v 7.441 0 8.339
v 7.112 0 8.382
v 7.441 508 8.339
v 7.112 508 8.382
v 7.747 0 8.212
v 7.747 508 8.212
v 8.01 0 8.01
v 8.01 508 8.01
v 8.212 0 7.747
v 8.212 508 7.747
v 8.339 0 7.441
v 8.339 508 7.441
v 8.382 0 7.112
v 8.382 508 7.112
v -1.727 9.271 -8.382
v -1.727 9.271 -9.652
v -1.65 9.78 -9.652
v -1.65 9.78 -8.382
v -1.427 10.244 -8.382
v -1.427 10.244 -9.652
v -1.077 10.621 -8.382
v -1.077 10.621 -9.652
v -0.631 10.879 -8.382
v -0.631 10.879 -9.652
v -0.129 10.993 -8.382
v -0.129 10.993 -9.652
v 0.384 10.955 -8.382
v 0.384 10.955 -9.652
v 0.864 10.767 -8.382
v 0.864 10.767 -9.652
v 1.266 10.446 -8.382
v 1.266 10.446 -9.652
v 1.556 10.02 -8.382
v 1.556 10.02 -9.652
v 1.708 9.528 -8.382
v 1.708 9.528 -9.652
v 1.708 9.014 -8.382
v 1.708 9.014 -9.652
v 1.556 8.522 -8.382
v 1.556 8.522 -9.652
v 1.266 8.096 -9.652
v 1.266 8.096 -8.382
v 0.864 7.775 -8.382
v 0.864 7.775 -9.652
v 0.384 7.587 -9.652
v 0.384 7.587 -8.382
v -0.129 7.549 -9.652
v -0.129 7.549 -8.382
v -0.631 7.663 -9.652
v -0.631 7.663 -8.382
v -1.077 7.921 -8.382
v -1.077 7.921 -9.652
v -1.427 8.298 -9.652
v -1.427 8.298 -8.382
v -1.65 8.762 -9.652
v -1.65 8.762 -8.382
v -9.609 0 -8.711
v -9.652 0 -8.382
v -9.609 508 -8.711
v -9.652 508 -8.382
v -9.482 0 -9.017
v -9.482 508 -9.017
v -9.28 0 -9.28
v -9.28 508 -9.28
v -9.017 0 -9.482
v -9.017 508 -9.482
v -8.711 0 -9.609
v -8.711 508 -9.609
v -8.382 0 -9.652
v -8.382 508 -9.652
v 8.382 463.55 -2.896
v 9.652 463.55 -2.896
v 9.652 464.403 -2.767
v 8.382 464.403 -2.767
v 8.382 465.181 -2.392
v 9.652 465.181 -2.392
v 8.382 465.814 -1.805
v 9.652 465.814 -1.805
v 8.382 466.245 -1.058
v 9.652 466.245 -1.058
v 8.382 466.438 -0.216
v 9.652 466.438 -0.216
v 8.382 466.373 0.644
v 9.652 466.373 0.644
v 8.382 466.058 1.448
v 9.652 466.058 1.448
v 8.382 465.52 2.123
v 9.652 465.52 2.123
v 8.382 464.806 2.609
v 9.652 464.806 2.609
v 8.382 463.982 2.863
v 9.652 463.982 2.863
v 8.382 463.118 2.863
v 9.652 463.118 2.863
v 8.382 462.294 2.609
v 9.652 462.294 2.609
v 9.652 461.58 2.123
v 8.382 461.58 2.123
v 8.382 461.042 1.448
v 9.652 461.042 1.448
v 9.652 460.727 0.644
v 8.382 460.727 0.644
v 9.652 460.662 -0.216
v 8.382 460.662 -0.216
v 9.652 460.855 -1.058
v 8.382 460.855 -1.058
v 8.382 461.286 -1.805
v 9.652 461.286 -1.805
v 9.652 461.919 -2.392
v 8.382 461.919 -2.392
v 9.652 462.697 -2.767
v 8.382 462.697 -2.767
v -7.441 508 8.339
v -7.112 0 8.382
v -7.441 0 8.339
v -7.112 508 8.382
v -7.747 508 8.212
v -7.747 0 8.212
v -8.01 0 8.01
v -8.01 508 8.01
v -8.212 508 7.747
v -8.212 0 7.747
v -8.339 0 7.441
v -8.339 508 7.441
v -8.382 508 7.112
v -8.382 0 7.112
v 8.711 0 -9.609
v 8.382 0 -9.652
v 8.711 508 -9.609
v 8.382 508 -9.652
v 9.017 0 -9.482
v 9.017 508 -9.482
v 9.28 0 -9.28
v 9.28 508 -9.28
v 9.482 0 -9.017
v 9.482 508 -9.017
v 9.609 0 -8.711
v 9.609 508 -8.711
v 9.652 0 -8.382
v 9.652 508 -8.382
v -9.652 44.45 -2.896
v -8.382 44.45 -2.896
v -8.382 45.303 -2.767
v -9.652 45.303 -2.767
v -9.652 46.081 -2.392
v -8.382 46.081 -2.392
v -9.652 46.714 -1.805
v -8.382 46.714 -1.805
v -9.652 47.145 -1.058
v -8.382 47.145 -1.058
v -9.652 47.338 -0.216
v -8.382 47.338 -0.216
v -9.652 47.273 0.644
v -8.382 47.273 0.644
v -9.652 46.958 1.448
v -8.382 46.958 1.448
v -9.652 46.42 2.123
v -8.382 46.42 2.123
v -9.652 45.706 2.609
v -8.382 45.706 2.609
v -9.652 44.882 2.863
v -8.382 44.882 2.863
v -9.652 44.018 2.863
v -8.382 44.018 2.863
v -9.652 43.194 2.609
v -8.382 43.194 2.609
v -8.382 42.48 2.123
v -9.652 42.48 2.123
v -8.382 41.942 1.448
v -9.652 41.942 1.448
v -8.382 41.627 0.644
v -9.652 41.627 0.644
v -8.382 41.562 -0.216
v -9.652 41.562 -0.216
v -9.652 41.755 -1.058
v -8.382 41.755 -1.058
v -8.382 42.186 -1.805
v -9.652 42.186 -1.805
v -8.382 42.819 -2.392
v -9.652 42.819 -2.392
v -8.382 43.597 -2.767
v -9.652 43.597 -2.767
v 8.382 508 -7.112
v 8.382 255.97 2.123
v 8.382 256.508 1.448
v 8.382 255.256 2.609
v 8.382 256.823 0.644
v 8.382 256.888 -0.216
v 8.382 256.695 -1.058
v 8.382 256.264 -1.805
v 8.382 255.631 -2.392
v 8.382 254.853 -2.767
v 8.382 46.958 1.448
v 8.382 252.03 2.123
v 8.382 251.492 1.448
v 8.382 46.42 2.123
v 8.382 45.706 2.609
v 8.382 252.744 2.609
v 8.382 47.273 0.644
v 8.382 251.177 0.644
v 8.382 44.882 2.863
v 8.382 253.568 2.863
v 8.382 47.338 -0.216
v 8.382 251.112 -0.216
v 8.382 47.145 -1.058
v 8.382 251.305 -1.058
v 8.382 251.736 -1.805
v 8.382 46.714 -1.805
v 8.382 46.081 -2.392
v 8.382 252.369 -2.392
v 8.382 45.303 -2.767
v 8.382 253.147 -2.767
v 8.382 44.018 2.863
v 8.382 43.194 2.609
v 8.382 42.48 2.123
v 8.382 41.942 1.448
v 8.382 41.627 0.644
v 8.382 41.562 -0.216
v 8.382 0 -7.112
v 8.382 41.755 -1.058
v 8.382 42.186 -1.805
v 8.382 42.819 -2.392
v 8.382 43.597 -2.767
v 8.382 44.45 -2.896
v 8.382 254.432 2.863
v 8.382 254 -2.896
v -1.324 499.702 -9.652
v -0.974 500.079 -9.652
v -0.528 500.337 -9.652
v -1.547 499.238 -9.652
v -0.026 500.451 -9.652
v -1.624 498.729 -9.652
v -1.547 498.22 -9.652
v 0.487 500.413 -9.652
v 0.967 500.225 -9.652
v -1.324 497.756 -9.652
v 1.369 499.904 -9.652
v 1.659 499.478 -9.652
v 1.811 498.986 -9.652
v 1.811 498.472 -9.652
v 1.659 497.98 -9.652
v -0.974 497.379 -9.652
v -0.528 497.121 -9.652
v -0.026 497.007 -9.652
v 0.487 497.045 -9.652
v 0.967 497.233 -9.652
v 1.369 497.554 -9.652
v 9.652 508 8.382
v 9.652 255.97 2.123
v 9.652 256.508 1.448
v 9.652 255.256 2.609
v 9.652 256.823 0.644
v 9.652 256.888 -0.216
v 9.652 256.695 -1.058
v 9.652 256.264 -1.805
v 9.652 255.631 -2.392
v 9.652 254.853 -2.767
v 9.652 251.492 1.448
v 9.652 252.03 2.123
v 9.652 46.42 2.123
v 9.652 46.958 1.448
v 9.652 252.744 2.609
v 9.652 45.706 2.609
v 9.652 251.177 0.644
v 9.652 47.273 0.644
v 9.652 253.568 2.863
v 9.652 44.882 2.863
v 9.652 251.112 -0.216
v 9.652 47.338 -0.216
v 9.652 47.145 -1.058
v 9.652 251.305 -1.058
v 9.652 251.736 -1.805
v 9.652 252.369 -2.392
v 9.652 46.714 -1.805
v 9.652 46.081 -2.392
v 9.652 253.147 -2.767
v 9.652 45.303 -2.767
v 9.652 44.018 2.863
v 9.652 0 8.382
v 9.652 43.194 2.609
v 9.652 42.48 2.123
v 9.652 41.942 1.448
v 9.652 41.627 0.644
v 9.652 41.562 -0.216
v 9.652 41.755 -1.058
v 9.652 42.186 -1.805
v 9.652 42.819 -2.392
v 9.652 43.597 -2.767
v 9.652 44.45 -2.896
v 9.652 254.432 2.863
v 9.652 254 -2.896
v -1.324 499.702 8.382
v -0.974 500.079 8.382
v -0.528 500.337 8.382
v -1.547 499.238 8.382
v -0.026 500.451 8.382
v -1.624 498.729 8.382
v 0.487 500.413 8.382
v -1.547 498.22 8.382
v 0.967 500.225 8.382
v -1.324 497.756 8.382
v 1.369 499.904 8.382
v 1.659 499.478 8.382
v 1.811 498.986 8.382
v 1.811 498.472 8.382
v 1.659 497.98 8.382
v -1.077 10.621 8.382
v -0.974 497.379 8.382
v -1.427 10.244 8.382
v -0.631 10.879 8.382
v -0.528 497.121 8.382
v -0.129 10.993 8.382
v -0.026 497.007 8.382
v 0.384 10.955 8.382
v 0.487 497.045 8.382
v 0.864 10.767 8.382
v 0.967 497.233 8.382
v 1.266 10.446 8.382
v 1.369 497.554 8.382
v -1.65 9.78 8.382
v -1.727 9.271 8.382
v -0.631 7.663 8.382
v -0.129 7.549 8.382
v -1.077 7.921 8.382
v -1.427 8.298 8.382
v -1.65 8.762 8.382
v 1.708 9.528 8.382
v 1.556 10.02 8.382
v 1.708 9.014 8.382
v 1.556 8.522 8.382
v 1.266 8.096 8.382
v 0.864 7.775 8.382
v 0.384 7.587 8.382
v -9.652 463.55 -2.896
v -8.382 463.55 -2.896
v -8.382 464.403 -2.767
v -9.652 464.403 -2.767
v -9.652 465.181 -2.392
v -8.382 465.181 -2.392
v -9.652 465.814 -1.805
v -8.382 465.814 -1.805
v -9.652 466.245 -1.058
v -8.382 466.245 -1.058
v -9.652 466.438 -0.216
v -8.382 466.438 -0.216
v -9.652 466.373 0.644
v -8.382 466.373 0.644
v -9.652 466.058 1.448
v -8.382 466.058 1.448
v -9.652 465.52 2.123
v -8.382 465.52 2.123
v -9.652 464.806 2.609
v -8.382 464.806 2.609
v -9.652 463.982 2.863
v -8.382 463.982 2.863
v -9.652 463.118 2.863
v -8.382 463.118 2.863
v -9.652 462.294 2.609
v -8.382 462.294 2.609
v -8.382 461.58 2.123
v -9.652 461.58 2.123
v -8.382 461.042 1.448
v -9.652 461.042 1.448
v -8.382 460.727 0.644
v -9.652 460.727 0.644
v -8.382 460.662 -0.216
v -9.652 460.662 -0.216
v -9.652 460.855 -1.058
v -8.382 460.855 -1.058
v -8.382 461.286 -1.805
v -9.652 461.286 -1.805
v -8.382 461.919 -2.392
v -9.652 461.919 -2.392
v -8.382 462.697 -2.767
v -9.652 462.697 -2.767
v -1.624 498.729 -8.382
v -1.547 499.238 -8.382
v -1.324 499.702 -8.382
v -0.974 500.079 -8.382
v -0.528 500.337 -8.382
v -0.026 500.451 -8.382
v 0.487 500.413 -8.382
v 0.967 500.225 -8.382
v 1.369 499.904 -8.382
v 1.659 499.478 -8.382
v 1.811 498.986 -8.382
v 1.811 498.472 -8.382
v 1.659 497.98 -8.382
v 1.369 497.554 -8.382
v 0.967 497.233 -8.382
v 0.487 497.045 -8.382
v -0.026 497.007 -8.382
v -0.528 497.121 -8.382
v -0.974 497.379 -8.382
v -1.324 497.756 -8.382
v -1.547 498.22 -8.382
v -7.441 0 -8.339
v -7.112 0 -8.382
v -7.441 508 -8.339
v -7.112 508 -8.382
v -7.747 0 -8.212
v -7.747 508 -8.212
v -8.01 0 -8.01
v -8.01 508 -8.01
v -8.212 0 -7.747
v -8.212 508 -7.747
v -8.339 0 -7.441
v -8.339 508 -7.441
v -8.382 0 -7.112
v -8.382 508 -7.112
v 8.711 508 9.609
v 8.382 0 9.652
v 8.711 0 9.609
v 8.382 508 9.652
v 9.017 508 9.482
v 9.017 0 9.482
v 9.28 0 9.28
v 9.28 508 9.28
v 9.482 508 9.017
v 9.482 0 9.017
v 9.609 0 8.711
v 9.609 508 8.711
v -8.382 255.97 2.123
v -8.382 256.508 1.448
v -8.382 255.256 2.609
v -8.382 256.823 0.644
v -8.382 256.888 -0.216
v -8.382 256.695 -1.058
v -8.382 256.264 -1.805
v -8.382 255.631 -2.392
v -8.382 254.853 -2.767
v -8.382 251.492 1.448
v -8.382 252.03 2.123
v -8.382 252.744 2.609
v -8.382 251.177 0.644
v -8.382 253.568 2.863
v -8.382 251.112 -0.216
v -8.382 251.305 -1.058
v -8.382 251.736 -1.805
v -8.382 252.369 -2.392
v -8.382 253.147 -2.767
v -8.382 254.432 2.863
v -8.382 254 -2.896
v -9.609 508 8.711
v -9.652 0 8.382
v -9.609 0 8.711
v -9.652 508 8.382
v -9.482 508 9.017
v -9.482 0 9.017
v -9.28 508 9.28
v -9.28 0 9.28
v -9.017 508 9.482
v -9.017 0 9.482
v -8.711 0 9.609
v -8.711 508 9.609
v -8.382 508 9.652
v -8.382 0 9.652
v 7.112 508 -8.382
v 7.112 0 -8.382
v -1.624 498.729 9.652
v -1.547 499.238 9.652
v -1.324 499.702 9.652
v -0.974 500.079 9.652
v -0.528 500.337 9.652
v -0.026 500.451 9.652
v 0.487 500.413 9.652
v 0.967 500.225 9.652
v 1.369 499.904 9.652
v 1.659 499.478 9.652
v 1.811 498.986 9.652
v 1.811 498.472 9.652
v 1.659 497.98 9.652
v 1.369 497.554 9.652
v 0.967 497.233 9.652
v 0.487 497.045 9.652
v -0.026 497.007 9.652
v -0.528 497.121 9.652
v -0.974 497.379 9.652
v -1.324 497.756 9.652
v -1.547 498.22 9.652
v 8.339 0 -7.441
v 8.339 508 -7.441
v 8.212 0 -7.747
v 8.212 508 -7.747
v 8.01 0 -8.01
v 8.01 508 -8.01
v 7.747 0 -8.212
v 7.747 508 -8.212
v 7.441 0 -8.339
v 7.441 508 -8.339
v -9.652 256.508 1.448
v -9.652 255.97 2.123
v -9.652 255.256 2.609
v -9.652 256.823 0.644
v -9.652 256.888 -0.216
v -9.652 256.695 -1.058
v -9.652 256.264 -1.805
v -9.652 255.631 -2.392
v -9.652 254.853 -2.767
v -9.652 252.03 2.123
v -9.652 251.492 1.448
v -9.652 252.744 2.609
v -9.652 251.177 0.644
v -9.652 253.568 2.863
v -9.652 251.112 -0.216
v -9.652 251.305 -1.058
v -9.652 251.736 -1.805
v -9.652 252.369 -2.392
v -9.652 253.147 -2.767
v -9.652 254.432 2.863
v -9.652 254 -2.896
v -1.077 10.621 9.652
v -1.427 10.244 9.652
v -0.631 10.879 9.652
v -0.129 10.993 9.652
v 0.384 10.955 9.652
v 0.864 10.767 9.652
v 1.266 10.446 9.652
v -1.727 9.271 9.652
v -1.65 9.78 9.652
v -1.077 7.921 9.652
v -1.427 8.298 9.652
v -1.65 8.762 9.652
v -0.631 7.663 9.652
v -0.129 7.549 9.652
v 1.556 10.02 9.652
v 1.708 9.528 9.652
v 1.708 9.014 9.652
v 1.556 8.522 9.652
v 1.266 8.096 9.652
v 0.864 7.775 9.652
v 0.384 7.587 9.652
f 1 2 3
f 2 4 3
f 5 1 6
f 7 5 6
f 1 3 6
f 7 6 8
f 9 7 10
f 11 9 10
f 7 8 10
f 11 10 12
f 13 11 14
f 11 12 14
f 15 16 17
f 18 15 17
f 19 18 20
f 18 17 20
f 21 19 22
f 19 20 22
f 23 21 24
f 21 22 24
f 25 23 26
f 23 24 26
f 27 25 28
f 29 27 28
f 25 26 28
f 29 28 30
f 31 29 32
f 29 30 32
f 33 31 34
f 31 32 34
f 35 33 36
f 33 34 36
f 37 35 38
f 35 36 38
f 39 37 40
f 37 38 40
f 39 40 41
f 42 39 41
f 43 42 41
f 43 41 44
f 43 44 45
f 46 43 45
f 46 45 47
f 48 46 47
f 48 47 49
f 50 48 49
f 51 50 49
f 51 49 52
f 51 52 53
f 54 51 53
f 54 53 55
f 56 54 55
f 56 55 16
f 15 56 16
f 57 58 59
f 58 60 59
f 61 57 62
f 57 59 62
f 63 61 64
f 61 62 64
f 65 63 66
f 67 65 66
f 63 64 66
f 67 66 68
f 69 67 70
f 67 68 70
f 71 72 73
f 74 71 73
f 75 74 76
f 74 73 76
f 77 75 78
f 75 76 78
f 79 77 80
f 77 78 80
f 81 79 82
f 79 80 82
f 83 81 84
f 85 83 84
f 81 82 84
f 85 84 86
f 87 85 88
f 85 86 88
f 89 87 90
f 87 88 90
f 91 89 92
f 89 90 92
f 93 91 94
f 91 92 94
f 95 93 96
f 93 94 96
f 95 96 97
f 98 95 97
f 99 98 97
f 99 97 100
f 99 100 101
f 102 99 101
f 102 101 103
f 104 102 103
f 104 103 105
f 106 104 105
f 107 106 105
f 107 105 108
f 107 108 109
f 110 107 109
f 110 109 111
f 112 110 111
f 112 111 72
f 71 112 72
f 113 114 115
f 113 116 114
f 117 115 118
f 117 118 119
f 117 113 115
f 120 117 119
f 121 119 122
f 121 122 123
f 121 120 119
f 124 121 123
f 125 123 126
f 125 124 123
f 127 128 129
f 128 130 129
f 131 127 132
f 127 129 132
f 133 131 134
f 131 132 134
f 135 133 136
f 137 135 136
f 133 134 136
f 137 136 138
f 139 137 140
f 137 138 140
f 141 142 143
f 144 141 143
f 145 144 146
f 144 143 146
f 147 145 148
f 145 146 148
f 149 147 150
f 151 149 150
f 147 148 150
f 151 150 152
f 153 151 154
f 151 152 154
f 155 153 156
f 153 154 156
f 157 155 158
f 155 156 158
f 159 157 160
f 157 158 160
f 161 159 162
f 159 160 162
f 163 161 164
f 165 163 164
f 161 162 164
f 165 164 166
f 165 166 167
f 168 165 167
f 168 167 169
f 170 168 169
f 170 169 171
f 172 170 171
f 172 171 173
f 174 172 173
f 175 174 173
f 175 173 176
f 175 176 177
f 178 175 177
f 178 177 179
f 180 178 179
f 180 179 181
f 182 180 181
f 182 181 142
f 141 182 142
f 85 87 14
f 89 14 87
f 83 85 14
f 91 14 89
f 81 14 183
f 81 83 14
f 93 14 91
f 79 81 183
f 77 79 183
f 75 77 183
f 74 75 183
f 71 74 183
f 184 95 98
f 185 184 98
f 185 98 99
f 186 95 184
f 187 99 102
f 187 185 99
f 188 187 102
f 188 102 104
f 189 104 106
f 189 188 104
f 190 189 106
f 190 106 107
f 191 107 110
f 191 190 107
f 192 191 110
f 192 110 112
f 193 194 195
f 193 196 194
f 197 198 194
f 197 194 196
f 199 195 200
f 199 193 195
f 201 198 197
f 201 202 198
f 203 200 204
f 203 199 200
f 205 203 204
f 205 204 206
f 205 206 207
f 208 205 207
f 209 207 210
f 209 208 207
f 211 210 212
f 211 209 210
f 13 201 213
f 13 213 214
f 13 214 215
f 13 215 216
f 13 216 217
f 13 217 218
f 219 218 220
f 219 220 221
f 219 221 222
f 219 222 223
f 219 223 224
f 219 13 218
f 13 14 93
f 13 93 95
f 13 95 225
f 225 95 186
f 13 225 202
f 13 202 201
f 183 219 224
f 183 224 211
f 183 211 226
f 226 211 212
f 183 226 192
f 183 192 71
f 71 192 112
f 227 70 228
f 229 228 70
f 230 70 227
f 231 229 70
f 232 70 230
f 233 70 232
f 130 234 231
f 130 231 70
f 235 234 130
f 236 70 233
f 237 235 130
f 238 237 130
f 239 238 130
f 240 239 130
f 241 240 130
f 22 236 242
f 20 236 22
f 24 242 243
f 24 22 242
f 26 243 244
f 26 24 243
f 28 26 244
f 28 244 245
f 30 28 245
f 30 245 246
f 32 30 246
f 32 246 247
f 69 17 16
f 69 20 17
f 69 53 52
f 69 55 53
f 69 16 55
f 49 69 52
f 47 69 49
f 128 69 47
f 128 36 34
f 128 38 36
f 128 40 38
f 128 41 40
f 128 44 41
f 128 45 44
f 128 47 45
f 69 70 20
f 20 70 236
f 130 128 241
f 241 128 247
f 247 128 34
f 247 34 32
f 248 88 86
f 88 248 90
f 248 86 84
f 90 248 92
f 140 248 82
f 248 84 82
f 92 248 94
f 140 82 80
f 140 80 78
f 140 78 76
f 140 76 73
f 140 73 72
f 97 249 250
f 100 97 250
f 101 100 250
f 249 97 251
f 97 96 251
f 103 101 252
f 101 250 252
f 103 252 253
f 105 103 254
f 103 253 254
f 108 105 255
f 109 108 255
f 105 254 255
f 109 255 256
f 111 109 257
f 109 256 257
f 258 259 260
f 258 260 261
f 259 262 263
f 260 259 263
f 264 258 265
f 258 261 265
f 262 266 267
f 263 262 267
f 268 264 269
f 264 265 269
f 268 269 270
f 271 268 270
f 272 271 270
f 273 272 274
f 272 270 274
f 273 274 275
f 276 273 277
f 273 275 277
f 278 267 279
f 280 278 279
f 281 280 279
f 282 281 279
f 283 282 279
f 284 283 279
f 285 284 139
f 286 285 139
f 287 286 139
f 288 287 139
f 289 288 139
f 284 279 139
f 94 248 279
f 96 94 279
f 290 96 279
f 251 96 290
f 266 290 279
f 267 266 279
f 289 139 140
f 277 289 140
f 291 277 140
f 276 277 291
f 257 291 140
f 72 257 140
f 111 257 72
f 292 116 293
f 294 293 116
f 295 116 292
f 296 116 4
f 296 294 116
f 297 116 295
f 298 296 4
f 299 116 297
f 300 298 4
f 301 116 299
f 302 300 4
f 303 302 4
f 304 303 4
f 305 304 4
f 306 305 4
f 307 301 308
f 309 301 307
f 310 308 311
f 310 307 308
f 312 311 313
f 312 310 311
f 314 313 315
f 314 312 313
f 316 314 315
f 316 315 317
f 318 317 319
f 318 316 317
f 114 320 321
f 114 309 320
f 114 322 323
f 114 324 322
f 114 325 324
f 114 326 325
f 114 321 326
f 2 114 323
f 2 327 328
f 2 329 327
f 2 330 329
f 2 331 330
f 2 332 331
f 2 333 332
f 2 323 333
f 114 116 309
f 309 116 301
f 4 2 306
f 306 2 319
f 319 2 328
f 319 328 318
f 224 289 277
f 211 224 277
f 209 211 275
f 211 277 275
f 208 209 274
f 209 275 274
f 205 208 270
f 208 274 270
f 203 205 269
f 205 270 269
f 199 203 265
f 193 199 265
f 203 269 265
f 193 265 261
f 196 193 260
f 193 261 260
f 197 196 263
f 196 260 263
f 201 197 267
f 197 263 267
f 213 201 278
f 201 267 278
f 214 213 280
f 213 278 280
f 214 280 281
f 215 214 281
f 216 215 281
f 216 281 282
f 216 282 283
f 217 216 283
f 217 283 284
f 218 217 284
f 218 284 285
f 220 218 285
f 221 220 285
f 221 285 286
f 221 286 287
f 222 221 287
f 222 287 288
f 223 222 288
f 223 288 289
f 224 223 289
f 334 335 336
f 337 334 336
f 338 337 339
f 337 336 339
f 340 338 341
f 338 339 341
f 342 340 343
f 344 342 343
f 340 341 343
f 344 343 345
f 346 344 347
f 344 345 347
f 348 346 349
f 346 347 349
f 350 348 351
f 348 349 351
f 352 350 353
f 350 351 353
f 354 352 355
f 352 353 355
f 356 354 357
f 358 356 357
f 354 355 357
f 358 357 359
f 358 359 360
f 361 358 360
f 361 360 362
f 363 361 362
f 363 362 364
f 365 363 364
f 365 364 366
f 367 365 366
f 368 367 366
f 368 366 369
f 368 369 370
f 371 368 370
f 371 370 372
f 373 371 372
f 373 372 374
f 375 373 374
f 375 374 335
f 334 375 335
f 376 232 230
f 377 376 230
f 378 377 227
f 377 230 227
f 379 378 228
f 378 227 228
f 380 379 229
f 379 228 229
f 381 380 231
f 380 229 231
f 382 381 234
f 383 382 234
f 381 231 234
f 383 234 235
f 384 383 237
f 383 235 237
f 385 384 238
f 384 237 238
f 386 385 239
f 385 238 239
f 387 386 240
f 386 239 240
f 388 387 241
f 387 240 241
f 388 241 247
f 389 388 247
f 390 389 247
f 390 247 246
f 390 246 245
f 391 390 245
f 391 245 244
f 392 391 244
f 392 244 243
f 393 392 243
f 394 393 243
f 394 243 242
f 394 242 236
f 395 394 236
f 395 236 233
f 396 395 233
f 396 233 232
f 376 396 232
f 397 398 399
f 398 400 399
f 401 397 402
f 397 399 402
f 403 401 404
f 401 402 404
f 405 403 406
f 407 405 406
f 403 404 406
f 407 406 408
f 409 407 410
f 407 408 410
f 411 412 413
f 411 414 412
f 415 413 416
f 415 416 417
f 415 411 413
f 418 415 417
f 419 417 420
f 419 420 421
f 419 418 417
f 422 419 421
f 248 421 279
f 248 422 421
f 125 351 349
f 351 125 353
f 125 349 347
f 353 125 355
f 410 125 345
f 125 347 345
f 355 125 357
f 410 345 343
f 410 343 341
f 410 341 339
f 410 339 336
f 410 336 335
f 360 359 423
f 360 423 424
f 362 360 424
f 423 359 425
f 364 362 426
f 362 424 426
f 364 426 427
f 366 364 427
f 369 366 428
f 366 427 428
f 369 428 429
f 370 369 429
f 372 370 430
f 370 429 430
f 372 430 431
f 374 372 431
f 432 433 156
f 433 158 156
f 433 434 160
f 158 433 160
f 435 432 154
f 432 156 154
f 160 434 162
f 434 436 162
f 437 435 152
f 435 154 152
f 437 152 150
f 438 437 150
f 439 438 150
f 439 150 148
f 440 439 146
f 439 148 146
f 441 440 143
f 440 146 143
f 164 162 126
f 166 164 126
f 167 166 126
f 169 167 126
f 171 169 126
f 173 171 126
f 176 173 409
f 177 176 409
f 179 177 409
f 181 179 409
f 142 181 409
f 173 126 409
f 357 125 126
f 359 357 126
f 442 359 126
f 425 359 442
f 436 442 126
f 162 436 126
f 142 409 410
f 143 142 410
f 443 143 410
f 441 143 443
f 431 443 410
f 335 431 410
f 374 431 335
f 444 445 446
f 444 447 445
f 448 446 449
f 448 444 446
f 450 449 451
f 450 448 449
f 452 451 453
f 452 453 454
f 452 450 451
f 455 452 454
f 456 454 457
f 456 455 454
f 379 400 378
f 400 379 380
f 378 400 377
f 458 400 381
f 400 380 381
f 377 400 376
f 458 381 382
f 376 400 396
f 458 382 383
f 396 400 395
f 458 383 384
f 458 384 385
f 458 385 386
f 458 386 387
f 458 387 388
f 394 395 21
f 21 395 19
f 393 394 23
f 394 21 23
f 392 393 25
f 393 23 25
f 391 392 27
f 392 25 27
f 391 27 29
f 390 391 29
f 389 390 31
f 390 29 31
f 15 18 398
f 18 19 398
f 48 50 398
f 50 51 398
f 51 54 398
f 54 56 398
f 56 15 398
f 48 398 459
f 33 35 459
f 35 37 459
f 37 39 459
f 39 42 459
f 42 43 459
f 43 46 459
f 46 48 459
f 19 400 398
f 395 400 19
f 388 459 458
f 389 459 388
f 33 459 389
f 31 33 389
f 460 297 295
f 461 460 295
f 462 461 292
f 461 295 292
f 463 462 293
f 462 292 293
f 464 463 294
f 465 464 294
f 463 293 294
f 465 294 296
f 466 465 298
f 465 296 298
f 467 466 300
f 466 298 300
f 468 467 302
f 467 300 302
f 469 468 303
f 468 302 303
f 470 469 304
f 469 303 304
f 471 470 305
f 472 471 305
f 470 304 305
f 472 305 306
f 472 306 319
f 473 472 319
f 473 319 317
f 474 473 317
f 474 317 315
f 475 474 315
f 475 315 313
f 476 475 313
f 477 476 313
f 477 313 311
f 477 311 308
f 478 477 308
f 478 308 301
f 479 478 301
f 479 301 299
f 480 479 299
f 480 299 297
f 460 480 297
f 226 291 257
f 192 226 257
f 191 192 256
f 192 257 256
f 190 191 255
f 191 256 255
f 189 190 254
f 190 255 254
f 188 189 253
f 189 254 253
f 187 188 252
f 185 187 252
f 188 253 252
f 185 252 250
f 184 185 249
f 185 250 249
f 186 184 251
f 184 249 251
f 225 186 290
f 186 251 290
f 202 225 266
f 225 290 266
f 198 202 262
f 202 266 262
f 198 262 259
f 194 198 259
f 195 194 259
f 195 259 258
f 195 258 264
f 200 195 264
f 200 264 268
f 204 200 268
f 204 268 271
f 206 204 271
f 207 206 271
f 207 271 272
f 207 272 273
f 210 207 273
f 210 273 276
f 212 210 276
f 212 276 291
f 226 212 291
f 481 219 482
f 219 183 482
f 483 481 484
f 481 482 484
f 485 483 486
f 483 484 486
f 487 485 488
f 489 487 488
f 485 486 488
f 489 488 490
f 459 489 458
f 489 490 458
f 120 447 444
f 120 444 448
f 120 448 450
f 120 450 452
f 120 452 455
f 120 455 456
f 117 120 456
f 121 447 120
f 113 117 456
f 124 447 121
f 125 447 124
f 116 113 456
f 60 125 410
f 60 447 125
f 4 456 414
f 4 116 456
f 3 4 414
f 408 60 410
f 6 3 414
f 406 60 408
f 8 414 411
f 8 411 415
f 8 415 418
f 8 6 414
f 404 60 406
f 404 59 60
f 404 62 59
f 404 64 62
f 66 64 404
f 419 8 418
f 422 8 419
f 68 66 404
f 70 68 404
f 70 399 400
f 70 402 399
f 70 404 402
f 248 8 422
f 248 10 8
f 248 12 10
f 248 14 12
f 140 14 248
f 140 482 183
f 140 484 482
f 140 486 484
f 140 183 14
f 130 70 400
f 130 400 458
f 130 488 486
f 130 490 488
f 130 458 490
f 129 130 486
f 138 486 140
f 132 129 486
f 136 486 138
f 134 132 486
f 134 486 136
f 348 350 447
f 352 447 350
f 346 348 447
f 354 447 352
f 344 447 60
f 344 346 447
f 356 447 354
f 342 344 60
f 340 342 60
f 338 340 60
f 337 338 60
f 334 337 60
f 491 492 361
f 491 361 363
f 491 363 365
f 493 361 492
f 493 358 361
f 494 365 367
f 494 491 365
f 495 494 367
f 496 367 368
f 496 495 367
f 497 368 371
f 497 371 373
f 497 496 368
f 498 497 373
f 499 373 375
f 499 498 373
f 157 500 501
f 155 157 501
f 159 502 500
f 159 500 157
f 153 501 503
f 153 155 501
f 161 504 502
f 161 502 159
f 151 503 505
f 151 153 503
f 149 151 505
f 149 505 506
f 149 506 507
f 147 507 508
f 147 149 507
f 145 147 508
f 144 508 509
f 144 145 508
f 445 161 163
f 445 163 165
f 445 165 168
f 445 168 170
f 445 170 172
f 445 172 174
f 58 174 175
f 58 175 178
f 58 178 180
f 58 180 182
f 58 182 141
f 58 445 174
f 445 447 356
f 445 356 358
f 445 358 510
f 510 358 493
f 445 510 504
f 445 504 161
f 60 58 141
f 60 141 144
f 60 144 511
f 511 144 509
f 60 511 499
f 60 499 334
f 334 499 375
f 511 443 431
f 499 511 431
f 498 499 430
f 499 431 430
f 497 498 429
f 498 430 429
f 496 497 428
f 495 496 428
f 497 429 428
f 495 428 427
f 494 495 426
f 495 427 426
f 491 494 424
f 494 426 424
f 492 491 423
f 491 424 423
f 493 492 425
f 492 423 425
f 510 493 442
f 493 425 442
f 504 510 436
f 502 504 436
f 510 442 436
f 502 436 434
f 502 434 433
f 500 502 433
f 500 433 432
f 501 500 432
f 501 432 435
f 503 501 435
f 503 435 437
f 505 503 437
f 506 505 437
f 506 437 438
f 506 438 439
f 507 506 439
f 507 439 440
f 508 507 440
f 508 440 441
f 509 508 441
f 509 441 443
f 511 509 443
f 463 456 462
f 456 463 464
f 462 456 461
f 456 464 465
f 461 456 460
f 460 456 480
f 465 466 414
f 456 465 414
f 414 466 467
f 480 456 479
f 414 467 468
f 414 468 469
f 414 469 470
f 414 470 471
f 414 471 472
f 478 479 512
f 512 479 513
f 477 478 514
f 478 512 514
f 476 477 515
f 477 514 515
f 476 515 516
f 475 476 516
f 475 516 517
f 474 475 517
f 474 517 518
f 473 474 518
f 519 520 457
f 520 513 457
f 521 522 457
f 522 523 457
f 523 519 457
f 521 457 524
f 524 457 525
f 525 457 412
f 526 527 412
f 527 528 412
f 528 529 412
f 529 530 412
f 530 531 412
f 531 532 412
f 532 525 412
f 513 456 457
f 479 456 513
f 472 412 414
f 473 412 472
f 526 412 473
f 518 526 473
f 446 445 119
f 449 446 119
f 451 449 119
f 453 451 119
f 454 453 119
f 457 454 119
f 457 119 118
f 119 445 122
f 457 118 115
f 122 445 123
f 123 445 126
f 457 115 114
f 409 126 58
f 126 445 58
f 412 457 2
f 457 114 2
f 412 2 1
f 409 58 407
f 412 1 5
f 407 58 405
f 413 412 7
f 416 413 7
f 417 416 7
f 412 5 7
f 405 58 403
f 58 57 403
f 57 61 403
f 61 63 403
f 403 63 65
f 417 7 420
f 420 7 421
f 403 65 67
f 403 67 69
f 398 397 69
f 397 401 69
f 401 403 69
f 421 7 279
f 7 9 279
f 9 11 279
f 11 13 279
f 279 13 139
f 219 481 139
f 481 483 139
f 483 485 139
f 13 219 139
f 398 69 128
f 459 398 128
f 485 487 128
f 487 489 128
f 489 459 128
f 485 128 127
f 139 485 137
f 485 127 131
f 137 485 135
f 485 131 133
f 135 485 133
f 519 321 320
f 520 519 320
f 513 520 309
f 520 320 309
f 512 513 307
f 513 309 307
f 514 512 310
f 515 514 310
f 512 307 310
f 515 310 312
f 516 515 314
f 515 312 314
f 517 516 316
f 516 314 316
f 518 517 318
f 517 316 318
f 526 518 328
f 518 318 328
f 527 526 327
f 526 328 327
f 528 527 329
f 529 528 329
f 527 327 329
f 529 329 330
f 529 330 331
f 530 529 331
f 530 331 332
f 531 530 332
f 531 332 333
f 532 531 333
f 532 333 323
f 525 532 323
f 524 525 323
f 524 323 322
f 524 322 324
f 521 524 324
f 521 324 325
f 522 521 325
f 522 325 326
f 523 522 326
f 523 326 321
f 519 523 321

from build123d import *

# Parameters (mm, degrees)
SKETCH1_W                  = 19.304
SKETCH1_H                  = 19.304
SKETCH1_W_2                = 16.764
SKETCH1_H_2                = 16.764
BOSS_EXTRUDE1_DEPTH        = 508
FILLET1_R                  = 1.27
F_1_0_228_DIAMETER_HOLE2_D = 5.7912
F_8_32_TAPPED_HOLE1_D      = 3.4544


with BuildPart() as part:
    # Sketch1 → Boss-Extrude1 (new body)
    with BuildSketch(Plane(origin=(0, 0, 0), x_dir=(1, 0, 0), z_dir=(0, 1, 0))):
        Rectangle(SKETCH1_W, SKETCH1_H)
        Rectangle(SKETCH1_W_2, SKETCH1_H_2, mode=Mode.SUBTRACT)
    extrude(amount=BOSS_EXTRUDE1_DEPTH)

    # Fillet1
    fillet1_edges = [part.edges().sort_by_distance(p)[0] for p in [
        (-8.382, 254, 8.382),
        (8.382, 254, 8.382),
        (8.382, 254, -8.382),
        (-8.382, 254, -8.382),
        (9.652, 254, 9.652),
        (-9.652, 254, 9.652),
        (-9.652, 254, -9.652),
        (9.652, 254, -9.652),
    ]]
    fillet(fillet1_edges, radius=FILLET1_R)

    # #1 (0.228) Diameter Hole2 (through all)
    with Locations(Plane.ZY.offset(9.652)):
        with Locations((0, 463.55), (0, 44.45), (0, 254)):
            Hole(F_1_0_228_DIAMETER_HOLE2_D / 2)

    # #8-32 Tapped Hole1 (through all)
    with Locations(Plane.XY.offset(9.652)):
        with Locations((0, 9.271), (0.103095802, 498.729)):
            Hole(F_8_32_TAPPED_HOLE1_D / 2)


solid = part.part
